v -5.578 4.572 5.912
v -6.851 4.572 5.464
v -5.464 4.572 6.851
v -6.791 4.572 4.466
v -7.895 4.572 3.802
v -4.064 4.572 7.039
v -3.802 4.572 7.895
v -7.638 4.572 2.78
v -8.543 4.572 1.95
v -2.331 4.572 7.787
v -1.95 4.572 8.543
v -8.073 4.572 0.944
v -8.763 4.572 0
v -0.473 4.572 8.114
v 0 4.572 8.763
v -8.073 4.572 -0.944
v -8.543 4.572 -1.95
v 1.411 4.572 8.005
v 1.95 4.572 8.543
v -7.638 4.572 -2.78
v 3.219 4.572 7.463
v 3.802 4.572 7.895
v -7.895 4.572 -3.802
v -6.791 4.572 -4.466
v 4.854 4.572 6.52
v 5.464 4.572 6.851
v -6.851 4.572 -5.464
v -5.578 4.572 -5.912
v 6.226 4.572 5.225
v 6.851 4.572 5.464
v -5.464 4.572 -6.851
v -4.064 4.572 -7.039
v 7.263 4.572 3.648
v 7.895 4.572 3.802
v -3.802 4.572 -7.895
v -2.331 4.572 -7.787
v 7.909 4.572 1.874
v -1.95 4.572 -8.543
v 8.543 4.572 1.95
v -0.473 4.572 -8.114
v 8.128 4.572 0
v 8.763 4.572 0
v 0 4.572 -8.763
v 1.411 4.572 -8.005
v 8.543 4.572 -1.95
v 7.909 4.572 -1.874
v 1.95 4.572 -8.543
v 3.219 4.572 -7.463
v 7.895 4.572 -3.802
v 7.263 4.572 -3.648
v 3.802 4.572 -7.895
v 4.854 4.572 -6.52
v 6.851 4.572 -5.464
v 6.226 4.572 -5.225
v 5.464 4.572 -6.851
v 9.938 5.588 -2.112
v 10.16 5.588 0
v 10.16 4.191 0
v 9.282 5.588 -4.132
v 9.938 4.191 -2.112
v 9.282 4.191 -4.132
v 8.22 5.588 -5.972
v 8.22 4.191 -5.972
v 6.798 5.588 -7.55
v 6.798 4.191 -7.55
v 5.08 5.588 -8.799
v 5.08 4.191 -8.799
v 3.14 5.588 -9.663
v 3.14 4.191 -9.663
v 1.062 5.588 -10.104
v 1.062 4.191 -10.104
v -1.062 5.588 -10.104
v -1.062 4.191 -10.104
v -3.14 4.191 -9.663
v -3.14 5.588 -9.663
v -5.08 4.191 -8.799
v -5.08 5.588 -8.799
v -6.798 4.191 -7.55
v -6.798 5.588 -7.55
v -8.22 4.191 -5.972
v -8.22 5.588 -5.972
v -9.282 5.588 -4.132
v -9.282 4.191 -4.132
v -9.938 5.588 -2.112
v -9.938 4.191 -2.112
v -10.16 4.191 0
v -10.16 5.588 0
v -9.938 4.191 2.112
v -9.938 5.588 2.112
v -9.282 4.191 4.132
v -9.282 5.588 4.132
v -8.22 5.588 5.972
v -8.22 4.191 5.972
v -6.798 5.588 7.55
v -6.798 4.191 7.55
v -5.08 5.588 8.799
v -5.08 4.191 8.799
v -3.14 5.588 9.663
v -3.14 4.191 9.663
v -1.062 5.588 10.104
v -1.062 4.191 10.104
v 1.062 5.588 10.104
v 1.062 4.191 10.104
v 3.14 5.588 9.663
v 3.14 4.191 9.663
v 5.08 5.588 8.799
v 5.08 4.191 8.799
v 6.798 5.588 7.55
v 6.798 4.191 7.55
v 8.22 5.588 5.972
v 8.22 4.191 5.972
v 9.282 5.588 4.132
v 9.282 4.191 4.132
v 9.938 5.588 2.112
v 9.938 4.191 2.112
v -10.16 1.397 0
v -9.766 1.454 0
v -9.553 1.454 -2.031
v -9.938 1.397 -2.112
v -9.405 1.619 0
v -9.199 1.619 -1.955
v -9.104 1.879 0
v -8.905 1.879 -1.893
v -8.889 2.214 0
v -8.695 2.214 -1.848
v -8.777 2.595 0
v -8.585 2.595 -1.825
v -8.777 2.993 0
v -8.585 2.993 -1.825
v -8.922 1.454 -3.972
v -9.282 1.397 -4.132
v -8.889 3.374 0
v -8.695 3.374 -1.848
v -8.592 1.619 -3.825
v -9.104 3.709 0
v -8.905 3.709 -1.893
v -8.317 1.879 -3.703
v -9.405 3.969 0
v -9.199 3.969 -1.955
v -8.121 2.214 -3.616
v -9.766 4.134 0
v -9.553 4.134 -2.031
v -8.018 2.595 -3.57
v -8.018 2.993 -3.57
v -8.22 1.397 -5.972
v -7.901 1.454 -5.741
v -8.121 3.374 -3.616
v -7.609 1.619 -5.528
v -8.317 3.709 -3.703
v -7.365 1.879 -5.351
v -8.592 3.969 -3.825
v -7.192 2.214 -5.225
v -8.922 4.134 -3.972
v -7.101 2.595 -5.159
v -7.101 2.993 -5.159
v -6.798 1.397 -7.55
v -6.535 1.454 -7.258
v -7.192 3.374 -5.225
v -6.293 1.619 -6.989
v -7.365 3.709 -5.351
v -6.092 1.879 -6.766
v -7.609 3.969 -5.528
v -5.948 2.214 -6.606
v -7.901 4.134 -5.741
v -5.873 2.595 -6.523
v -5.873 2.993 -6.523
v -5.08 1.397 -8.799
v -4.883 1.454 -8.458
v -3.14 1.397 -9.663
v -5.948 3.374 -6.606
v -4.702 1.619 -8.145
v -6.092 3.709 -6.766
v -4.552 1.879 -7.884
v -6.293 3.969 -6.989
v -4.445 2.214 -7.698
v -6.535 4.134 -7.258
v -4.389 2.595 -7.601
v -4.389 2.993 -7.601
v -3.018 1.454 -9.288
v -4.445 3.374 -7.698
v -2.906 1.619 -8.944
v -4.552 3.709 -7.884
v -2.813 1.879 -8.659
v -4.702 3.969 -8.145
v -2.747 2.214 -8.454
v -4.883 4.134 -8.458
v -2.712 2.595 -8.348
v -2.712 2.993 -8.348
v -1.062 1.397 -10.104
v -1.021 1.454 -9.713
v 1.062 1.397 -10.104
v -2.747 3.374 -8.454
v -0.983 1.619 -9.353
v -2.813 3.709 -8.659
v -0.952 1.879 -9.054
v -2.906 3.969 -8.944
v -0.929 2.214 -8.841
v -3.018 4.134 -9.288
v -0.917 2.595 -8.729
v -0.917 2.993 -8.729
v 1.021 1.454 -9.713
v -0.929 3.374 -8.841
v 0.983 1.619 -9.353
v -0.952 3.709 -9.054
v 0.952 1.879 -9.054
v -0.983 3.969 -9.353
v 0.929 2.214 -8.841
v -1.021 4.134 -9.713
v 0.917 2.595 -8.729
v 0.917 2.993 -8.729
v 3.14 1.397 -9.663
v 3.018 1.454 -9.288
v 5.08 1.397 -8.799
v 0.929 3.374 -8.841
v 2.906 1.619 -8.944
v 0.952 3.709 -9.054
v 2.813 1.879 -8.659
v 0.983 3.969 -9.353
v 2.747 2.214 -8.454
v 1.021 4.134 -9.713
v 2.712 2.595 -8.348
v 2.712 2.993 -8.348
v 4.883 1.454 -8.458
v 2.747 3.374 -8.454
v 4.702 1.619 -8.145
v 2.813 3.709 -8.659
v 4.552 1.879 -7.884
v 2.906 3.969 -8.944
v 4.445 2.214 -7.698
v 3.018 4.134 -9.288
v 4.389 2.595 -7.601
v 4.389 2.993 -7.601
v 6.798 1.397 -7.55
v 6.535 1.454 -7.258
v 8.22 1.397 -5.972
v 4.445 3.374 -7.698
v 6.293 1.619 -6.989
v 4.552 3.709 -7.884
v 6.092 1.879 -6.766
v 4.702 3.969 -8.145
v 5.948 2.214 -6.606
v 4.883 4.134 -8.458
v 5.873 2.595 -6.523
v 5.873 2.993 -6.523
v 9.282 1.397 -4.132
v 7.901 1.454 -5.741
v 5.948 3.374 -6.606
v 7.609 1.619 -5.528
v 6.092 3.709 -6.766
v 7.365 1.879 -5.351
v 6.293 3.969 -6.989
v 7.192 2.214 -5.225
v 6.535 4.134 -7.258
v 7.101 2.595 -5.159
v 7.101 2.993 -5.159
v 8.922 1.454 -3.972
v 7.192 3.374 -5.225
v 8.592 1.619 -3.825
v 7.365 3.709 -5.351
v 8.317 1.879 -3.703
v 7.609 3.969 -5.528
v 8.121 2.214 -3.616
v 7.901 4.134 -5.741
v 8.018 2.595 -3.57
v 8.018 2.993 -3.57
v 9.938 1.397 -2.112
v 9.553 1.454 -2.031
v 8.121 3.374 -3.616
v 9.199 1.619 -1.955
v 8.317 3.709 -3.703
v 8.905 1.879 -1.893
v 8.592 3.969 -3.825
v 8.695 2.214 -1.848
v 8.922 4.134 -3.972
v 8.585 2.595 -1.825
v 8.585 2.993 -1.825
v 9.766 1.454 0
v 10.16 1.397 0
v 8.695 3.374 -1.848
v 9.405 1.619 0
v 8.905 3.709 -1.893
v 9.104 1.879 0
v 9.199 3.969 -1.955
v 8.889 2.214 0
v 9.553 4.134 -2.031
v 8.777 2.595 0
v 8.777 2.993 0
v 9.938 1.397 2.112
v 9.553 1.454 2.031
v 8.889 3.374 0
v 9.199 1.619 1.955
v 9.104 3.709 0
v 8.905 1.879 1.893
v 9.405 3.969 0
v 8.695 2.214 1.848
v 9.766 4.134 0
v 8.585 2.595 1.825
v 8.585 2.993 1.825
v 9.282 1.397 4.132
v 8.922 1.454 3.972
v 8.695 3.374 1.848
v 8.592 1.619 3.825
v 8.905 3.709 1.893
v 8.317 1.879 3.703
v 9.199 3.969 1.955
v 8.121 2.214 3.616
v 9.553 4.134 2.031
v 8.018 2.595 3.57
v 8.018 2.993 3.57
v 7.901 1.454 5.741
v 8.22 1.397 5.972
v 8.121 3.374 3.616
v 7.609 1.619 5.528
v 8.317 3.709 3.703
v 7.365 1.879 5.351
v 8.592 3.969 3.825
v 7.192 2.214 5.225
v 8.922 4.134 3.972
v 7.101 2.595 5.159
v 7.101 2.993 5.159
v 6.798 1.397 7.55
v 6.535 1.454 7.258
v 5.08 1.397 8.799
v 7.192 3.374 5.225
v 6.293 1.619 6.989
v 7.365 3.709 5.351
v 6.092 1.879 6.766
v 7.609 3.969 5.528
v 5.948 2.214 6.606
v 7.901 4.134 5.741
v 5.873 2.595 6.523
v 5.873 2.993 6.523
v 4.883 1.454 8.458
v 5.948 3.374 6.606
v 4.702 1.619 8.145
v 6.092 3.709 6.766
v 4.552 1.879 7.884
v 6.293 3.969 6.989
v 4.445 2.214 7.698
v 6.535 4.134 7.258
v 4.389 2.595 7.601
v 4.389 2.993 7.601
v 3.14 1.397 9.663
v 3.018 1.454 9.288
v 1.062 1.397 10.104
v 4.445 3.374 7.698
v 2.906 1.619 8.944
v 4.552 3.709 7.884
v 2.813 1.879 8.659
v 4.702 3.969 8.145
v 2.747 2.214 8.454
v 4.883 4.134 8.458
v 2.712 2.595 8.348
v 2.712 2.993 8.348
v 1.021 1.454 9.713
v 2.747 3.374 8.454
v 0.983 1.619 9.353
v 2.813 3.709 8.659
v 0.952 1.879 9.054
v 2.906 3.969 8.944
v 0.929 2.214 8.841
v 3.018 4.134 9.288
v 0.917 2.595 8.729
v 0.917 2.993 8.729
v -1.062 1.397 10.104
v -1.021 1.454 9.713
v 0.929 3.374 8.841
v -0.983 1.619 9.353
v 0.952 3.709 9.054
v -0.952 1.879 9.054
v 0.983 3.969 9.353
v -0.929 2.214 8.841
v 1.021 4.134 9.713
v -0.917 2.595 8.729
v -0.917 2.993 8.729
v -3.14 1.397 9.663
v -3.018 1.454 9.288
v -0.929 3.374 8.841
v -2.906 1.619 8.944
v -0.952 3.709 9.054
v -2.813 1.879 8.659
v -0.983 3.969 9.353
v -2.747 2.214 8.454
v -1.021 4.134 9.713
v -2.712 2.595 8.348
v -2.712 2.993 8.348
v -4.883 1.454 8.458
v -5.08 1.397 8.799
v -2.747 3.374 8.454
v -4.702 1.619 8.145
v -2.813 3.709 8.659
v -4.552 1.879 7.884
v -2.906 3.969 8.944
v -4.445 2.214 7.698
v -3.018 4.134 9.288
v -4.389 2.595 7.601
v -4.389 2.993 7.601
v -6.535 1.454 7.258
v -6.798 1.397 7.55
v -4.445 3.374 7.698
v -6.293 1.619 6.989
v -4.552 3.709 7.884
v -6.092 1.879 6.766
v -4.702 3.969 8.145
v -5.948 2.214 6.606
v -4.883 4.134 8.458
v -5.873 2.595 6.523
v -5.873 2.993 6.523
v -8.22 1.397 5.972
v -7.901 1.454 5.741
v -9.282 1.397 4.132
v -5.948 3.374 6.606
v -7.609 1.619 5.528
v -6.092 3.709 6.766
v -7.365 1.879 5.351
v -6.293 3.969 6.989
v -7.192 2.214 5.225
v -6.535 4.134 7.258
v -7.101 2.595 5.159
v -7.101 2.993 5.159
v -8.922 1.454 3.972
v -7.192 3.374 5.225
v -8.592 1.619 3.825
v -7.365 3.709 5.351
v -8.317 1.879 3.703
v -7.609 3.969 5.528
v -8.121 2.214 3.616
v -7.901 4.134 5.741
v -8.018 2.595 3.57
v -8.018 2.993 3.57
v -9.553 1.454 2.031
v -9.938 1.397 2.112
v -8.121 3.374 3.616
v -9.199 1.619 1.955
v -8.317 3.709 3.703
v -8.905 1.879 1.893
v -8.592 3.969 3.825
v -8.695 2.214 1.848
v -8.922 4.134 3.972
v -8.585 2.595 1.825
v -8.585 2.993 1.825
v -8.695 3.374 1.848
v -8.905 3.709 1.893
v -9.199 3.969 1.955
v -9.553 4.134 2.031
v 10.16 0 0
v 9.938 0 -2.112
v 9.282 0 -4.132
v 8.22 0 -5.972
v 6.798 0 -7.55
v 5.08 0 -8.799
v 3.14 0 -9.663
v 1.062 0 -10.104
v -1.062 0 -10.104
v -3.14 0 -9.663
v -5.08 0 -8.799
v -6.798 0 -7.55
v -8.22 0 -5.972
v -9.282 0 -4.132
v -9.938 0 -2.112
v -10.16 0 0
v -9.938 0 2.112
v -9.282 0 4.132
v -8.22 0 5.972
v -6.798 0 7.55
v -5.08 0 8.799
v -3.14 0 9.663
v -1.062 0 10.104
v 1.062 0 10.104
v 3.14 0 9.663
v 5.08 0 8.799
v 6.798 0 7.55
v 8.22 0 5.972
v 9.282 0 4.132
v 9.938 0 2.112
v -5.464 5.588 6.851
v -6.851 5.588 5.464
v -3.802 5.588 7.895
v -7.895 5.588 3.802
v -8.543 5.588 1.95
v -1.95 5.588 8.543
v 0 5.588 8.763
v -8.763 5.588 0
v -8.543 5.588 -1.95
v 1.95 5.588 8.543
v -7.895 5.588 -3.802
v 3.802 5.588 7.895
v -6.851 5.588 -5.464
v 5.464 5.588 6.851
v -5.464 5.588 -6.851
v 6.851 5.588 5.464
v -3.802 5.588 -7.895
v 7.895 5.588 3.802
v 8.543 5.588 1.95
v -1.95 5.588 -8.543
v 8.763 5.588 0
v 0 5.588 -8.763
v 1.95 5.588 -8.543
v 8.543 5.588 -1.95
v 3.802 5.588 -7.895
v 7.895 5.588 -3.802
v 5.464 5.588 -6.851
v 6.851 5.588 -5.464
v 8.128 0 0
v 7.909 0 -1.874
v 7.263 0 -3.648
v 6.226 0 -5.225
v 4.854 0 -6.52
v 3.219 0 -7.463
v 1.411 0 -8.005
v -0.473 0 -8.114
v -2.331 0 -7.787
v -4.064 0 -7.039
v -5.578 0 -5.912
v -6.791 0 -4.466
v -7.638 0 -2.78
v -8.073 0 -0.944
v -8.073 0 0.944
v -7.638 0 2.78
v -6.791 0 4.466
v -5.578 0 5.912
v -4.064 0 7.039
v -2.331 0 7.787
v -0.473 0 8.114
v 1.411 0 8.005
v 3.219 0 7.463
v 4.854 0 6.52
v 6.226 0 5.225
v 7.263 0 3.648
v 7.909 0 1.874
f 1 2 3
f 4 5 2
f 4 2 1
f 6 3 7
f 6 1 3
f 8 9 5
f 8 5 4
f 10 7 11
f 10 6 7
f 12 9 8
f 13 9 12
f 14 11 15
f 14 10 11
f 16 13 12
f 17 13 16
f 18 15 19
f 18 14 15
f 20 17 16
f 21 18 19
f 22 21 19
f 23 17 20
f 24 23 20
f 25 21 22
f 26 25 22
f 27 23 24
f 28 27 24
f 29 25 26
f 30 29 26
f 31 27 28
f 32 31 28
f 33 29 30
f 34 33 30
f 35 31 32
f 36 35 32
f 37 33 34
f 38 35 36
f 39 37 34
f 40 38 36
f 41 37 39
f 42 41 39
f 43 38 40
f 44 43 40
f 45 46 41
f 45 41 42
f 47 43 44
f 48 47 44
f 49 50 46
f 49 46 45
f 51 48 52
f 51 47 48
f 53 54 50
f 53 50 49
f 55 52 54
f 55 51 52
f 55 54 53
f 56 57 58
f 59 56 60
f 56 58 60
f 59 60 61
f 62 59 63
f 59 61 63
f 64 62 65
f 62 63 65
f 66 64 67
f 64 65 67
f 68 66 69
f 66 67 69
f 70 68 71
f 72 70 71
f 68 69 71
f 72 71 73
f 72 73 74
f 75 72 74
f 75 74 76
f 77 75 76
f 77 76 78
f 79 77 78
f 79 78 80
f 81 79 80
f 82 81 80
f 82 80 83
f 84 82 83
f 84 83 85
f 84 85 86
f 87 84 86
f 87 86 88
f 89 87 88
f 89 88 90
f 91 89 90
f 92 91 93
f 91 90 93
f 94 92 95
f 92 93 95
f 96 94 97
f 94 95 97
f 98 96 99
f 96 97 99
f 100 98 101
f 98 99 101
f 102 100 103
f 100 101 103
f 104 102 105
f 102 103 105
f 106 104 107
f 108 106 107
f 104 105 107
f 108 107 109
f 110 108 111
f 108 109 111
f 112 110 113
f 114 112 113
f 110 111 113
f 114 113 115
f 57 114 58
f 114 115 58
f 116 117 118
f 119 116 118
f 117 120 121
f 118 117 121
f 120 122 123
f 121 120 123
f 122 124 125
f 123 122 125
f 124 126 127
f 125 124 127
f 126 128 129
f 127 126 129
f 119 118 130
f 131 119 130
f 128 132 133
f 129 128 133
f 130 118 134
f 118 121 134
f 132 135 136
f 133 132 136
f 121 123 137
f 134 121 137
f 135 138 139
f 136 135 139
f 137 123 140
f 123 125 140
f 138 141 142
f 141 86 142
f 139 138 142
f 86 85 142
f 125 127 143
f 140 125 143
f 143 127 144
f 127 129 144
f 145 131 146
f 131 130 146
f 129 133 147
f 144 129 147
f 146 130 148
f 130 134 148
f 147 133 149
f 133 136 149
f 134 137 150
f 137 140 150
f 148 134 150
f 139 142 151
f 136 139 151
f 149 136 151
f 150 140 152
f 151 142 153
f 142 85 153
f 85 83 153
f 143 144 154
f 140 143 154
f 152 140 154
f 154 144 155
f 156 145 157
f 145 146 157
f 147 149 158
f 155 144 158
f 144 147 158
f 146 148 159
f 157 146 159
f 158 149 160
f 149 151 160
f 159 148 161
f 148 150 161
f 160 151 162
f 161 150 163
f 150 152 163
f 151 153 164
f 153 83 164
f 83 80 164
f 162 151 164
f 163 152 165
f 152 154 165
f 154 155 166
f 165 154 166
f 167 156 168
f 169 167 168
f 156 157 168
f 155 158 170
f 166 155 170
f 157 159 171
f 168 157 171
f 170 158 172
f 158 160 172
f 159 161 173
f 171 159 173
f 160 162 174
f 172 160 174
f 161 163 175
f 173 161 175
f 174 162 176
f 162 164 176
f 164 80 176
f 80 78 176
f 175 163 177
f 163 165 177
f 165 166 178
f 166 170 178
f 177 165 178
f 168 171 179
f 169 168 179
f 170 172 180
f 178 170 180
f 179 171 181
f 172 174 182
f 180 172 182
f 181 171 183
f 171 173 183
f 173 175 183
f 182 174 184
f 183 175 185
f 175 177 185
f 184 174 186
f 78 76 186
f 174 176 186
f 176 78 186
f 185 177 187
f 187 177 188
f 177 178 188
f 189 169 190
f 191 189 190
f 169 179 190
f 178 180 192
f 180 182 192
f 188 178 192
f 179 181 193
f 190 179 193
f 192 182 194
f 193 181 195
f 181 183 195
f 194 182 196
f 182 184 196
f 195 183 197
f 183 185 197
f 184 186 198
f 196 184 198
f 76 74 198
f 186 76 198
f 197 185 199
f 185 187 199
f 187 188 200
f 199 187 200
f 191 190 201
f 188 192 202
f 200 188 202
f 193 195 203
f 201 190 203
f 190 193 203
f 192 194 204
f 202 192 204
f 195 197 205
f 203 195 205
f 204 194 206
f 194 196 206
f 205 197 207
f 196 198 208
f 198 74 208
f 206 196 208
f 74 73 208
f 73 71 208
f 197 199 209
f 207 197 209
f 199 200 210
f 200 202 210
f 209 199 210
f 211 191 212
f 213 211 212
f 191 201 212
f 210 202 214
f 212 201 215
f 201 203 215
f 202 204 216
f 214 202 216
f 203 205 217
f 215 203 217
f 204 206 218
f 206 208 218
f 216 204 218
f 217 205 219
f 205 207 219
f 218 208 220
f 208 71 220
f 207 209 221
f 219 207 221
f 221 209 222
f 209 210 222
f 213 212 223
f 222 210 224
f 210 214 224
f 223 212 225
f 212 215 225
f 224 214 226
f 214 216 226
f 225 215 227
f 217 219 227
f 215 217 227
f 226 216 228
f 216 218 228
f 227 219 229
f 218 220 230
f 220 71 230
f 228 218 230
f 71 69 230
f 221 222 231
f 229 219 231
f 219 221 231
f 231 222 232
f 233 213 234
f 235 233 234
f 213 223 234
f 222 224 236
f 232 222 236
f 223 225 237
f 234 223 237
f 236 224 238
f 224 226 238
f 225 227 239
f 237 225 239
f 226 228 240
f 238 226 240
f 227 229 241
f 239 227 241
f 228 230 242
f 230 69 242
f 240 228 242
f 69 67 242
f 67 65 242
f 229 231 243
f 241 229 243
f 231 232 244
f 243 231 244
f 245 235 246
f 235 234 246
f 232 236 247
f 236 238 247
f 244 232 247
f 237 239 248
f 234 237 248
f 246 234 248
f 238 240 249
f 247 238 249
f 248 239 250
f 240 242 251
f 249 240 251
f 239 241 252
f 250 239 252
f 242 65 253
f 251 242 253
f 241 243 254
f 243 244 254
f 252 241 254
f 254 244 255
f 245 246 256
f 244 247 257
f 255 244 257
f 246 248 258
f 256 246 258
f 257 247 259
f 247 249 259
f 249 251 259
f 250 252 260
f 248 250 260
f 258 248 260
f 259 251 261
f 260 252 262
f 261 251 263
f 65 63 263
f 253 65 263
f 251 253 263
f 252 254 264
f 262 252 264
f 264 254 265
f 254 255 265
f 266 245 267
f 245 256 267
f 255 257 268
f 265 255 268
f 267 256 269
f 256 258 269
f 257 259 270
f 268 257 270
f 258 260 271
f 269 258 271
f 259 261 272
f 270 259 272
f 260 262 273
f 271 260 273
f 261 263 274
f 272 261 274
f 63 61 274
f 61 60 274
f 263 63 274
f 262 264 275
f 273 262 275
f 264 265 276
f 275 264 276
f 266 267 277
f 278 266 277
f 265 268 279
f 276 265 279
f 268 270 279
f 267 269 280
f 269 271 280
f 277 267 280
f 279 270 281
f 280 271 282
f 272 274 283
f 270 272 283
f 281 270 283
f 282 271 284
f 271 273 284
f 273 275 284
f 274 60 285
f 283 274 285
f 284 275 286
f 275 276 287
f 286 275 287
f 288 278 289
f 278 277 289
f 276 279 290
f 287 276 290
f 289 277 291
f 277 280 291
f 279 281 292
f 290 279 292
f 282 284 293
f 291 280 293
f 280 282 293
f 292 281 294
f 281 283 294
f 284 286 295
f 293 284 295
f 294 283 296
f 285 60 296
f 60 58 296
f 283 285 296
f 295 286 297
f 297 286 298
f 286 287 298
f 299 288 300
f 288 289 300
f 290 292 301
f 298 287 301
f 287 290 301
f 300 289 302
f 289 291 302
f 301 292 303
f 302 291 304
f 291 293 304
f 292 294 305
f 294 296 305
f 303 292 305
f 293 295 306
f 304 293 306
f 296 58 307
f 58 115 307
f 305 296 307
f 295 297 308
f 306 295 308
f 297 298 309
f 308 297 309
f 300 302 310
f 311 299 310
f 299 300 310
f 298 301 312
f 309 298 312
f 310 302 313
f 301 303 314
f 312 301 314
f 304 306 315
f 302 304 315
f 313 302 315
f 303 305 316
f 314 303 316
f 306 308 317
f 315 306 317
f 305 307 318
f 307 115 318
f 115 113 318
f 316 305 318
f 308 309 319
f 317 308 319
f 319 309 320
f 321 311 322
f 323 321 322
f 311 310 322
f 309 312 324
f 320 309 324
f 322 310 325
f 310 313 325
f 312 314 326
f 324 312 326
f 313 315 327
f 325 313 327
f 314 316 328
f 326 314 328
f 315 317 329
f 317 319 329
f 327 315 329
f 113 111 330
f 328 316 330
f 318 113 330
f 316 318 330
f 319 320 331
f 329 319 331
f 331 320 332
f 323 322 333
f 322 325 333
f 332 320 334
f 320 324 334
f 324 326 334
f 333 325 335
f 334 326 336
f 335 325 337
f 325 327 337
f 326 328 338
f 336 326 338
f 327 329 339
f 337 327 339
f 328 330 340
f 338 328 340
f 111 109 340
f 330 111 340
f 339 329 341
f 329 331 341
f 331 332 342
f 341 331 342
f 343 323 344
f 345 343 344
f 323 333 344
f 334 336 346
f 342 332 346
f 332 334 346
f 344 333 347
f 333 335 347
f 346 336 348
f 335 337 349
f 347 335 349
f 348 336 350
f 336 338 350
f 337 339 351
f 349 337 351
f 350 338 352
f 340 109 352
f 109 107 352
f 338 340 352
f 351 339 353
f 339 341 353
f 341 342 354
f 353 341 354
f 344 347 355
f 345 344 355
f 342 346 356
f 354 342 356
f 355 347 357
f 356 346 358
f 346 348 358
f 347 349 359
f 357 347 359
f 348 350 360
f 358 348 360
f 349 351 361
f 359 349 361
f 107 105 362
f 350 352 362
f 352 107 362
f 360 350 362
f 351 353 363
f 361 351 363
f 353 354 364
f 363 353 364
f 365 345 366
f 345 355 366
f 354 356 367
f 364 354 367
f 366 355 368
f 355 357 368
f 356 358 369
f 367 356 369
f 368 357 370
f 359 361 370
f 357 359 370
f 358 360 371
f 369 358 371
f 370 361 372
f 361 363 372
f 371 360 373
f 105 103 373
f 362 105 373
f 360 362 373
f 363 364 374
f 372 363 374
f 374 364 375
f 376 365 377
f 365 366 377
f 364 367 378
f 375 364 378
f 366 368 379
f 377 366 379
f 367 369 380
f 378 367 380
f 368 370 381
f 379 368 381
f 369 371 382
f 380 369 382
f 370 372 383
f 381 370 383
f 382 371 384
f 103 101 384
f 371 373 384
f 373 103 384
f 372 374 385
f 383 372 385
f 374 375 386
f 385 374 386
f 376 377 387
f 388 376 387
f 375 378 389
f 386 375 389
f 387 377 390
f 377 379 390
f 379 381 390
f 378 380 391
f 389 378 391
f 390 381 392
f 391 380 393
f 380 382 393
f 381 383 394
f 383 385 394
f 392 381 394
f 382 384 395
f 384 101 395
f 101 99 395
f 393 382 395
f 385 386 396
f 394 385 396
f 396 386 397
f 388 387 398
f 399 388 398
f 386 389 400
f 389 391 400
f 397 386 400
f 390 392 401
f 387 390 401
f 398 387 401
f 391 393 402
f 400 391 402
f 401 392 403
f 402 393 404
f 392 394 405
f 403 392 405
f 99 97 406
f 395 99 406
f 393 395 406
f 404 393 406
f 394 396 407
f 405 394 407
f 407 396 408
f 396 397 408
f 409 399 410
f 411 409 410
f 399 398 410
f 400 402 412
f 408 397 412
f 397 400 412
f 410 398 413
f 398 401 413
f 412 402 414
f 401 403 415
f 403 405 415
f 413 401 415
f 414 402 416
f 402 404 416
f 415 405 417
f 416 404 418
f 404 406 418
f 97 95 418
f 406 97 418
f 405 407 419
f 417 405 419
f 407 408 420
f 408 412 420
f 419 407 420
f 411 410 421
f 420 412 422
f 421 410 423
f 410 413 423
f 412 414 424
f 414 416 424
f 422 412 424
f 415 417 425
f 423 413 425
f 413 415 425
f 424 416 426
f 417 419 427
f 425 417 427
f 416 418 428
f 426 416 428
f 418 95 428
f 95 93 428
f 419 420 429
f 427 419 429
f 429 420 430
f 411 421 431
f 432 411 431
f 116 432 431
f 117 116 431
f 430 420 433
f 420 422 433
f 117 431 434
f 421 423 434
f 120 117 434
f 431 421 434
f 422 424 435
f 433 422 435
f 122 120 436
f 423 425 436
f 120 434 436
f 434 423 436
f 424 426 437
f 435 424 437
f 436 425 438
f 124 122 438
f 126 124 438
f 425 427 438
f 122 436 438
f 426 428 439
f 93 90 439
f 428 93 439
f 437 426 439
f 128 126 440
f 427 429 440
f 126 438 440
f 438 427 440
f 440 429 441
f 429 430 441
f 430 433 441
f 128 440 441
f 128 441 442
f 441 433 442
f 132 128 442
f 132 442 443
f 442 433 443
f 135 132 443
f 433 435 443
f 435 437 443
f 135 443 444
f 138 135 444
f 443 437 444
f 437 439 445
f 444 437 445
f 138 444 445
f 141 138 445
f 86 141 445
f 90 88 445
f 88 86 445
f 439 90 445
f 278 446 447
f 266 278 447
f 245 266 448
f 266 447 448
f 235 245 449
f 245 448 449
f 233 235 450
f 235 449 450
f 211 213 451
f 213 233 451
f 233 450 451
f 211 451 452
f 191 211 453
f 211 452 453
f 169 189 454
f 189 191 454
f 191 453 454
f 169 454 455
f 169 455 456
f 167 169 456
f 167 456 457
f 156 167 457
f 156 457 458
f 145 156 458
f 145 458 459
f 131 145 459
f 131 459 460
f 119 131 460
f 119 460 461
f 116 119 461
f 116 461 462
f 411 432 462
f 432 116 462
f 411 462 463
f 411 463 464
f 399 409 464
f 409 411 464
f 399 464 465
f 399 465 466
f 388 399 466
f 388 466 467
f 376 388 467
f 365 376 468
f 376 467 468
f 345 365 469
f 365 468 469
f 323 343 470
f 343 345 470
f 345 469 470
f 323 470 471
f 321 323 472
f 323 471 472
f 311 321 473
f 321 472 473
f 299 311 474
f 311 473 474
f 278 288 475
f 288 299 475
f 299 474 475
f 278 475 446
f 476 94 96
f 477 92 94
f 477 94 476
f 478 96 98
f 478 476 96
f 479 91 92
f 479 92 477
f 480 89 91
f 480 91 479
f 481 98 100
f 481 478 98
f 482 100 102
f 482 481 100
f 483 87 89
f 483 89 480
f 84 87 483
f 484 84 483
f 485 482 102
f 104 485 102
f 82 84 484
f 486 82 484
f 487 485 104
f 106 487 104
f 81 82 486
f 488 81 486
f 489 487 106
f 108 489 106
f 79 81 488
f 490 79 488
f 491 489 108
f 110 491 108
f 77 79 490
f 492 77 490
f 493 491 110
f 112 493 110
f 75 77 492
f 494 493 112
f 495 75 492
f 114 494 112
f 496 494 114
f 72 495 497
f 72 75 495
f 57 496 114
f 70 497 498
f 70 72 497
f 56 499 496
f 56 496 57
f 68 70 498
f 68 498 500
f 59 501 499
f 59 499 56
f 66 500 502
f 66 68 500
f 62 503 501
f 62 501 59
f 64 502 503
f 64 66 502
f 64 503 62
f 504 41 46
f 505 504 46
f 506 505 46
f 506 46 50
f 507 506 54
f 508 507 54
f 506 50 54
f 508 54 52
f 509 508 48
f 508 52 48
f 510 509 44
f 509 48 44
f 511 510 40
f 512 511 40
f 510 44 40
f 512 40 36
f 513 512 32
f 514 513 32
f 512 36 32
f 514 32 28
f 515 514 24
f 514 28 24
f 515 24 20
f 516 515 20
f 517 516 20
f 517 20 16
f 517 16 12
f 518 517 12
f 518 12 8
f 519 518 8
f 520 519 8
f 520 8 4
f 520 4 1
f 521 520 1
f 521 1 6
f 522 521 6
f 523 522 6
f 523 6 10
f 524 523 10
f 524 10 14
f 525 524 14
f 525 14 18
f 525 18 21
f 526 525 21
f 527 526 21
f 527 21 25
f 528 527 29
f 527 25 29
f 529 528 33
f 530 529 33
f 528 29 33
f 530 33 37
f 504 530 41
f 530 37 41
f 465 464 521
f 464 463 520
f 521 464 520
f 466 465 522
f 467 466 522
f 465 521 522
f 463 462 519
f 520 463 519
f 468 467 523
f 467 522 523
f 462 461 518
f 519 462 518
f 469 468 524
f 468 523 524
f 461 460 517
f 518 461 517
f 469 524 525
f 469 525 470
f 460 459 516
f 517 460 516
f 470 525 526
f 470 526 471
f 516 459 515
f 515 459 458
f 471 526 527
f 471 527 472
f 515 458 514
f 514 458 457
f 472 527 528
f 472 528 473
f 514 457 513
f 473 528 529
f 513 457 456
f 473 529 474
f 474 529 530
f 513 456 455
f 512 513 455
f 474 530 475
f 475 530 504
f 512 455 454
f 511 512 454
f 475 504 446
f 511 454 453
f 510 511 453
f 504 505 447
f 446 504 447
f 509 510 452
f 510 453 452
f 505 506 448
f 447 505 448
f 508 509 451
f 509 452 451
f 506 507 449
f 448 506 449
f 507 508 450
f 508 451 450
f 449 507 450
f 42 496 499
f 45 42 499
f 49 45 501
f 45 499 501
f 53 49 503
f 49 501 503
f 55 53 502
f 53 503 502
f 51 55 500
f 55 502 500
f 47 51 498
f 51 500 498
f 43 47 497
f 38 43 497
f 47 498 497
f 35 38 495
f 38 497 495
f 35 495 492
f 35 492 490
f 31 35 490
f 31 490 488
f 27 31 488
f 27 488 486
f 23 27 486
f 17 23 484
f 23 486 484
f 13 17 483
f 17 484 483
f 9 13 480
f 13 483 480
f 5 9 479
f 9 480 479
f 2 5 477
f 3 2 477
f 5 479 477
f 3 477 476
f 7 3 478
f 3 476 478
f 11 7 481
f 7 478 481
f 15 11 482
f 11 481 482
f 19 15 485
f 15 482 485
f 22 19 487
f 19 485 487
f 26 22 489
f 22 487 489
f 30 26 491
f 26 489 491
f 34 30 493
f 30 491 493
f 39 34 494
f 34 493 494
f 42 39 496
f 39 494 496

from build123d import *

# Parameters (mm, degrees)
SKETCH1_R           = 10.16
BOSS_EXTRUDE1_DEPTH = 5.588
SKETCH3_R           = 8.128
CUT_EXTRUDE1_DEPTH  = 10.16
SKETCH4_R           = 8.763
CUT_EXTRUDE2_DEPTH  = 1.016


with BuildPart() as part:
    # Sketch1 → Boss-Extrude1 (new body)
    with BuildSketch(Plane(origin=(0, 0, 0), x_dir=(1, 0, 0), z_dir=(0, 1, 0))):
        Circle(SKETCH1_R)
    extrude(amount=BOSS_EXTRUDE1_DEPTH)

    # Sketch2 → Cut-Revolve1 (revolve, cut)
    with BuildSketch(Plane.XY):
        with BuildLine():
            Line((-10.16, 4.191), (-10.16, 1.397))
            ThreePointArc((-10.16, 1.397), (-8.763, 2.794), (-10.16, 4.191))
        make_face()
    revolve(axis=Axis((0, 5.588, 0), (0, -1, 0)), mode=Mode.SUBTRACT)

    # Sketch3 → Cut-Extrude1 (cut)
    with BuildSketch(Plane(origin=(0, 5.588, 0), x_dir=(1, 0, 0), z_dir=(0, 1, 0))):
        Circle(SKETCH3_R)
    extrude(amount=-CUT_EXTRUDE1_DEPTH, mode=Mode.SUBTRACT)

    # Sketch4 → Cut-Extrude2 (cut)
    with BuildSketch(Plane(origin=(0, 5.588, 0), x_dir=(1, 0, 0), z_dir=(0, 1, 0))):
        Circle(SKETCH4_R)
    extrude(amount=-CUT_EXTRUDE2_DEPTH, mode=Mode.SUBTRACT)


solid = part.part
